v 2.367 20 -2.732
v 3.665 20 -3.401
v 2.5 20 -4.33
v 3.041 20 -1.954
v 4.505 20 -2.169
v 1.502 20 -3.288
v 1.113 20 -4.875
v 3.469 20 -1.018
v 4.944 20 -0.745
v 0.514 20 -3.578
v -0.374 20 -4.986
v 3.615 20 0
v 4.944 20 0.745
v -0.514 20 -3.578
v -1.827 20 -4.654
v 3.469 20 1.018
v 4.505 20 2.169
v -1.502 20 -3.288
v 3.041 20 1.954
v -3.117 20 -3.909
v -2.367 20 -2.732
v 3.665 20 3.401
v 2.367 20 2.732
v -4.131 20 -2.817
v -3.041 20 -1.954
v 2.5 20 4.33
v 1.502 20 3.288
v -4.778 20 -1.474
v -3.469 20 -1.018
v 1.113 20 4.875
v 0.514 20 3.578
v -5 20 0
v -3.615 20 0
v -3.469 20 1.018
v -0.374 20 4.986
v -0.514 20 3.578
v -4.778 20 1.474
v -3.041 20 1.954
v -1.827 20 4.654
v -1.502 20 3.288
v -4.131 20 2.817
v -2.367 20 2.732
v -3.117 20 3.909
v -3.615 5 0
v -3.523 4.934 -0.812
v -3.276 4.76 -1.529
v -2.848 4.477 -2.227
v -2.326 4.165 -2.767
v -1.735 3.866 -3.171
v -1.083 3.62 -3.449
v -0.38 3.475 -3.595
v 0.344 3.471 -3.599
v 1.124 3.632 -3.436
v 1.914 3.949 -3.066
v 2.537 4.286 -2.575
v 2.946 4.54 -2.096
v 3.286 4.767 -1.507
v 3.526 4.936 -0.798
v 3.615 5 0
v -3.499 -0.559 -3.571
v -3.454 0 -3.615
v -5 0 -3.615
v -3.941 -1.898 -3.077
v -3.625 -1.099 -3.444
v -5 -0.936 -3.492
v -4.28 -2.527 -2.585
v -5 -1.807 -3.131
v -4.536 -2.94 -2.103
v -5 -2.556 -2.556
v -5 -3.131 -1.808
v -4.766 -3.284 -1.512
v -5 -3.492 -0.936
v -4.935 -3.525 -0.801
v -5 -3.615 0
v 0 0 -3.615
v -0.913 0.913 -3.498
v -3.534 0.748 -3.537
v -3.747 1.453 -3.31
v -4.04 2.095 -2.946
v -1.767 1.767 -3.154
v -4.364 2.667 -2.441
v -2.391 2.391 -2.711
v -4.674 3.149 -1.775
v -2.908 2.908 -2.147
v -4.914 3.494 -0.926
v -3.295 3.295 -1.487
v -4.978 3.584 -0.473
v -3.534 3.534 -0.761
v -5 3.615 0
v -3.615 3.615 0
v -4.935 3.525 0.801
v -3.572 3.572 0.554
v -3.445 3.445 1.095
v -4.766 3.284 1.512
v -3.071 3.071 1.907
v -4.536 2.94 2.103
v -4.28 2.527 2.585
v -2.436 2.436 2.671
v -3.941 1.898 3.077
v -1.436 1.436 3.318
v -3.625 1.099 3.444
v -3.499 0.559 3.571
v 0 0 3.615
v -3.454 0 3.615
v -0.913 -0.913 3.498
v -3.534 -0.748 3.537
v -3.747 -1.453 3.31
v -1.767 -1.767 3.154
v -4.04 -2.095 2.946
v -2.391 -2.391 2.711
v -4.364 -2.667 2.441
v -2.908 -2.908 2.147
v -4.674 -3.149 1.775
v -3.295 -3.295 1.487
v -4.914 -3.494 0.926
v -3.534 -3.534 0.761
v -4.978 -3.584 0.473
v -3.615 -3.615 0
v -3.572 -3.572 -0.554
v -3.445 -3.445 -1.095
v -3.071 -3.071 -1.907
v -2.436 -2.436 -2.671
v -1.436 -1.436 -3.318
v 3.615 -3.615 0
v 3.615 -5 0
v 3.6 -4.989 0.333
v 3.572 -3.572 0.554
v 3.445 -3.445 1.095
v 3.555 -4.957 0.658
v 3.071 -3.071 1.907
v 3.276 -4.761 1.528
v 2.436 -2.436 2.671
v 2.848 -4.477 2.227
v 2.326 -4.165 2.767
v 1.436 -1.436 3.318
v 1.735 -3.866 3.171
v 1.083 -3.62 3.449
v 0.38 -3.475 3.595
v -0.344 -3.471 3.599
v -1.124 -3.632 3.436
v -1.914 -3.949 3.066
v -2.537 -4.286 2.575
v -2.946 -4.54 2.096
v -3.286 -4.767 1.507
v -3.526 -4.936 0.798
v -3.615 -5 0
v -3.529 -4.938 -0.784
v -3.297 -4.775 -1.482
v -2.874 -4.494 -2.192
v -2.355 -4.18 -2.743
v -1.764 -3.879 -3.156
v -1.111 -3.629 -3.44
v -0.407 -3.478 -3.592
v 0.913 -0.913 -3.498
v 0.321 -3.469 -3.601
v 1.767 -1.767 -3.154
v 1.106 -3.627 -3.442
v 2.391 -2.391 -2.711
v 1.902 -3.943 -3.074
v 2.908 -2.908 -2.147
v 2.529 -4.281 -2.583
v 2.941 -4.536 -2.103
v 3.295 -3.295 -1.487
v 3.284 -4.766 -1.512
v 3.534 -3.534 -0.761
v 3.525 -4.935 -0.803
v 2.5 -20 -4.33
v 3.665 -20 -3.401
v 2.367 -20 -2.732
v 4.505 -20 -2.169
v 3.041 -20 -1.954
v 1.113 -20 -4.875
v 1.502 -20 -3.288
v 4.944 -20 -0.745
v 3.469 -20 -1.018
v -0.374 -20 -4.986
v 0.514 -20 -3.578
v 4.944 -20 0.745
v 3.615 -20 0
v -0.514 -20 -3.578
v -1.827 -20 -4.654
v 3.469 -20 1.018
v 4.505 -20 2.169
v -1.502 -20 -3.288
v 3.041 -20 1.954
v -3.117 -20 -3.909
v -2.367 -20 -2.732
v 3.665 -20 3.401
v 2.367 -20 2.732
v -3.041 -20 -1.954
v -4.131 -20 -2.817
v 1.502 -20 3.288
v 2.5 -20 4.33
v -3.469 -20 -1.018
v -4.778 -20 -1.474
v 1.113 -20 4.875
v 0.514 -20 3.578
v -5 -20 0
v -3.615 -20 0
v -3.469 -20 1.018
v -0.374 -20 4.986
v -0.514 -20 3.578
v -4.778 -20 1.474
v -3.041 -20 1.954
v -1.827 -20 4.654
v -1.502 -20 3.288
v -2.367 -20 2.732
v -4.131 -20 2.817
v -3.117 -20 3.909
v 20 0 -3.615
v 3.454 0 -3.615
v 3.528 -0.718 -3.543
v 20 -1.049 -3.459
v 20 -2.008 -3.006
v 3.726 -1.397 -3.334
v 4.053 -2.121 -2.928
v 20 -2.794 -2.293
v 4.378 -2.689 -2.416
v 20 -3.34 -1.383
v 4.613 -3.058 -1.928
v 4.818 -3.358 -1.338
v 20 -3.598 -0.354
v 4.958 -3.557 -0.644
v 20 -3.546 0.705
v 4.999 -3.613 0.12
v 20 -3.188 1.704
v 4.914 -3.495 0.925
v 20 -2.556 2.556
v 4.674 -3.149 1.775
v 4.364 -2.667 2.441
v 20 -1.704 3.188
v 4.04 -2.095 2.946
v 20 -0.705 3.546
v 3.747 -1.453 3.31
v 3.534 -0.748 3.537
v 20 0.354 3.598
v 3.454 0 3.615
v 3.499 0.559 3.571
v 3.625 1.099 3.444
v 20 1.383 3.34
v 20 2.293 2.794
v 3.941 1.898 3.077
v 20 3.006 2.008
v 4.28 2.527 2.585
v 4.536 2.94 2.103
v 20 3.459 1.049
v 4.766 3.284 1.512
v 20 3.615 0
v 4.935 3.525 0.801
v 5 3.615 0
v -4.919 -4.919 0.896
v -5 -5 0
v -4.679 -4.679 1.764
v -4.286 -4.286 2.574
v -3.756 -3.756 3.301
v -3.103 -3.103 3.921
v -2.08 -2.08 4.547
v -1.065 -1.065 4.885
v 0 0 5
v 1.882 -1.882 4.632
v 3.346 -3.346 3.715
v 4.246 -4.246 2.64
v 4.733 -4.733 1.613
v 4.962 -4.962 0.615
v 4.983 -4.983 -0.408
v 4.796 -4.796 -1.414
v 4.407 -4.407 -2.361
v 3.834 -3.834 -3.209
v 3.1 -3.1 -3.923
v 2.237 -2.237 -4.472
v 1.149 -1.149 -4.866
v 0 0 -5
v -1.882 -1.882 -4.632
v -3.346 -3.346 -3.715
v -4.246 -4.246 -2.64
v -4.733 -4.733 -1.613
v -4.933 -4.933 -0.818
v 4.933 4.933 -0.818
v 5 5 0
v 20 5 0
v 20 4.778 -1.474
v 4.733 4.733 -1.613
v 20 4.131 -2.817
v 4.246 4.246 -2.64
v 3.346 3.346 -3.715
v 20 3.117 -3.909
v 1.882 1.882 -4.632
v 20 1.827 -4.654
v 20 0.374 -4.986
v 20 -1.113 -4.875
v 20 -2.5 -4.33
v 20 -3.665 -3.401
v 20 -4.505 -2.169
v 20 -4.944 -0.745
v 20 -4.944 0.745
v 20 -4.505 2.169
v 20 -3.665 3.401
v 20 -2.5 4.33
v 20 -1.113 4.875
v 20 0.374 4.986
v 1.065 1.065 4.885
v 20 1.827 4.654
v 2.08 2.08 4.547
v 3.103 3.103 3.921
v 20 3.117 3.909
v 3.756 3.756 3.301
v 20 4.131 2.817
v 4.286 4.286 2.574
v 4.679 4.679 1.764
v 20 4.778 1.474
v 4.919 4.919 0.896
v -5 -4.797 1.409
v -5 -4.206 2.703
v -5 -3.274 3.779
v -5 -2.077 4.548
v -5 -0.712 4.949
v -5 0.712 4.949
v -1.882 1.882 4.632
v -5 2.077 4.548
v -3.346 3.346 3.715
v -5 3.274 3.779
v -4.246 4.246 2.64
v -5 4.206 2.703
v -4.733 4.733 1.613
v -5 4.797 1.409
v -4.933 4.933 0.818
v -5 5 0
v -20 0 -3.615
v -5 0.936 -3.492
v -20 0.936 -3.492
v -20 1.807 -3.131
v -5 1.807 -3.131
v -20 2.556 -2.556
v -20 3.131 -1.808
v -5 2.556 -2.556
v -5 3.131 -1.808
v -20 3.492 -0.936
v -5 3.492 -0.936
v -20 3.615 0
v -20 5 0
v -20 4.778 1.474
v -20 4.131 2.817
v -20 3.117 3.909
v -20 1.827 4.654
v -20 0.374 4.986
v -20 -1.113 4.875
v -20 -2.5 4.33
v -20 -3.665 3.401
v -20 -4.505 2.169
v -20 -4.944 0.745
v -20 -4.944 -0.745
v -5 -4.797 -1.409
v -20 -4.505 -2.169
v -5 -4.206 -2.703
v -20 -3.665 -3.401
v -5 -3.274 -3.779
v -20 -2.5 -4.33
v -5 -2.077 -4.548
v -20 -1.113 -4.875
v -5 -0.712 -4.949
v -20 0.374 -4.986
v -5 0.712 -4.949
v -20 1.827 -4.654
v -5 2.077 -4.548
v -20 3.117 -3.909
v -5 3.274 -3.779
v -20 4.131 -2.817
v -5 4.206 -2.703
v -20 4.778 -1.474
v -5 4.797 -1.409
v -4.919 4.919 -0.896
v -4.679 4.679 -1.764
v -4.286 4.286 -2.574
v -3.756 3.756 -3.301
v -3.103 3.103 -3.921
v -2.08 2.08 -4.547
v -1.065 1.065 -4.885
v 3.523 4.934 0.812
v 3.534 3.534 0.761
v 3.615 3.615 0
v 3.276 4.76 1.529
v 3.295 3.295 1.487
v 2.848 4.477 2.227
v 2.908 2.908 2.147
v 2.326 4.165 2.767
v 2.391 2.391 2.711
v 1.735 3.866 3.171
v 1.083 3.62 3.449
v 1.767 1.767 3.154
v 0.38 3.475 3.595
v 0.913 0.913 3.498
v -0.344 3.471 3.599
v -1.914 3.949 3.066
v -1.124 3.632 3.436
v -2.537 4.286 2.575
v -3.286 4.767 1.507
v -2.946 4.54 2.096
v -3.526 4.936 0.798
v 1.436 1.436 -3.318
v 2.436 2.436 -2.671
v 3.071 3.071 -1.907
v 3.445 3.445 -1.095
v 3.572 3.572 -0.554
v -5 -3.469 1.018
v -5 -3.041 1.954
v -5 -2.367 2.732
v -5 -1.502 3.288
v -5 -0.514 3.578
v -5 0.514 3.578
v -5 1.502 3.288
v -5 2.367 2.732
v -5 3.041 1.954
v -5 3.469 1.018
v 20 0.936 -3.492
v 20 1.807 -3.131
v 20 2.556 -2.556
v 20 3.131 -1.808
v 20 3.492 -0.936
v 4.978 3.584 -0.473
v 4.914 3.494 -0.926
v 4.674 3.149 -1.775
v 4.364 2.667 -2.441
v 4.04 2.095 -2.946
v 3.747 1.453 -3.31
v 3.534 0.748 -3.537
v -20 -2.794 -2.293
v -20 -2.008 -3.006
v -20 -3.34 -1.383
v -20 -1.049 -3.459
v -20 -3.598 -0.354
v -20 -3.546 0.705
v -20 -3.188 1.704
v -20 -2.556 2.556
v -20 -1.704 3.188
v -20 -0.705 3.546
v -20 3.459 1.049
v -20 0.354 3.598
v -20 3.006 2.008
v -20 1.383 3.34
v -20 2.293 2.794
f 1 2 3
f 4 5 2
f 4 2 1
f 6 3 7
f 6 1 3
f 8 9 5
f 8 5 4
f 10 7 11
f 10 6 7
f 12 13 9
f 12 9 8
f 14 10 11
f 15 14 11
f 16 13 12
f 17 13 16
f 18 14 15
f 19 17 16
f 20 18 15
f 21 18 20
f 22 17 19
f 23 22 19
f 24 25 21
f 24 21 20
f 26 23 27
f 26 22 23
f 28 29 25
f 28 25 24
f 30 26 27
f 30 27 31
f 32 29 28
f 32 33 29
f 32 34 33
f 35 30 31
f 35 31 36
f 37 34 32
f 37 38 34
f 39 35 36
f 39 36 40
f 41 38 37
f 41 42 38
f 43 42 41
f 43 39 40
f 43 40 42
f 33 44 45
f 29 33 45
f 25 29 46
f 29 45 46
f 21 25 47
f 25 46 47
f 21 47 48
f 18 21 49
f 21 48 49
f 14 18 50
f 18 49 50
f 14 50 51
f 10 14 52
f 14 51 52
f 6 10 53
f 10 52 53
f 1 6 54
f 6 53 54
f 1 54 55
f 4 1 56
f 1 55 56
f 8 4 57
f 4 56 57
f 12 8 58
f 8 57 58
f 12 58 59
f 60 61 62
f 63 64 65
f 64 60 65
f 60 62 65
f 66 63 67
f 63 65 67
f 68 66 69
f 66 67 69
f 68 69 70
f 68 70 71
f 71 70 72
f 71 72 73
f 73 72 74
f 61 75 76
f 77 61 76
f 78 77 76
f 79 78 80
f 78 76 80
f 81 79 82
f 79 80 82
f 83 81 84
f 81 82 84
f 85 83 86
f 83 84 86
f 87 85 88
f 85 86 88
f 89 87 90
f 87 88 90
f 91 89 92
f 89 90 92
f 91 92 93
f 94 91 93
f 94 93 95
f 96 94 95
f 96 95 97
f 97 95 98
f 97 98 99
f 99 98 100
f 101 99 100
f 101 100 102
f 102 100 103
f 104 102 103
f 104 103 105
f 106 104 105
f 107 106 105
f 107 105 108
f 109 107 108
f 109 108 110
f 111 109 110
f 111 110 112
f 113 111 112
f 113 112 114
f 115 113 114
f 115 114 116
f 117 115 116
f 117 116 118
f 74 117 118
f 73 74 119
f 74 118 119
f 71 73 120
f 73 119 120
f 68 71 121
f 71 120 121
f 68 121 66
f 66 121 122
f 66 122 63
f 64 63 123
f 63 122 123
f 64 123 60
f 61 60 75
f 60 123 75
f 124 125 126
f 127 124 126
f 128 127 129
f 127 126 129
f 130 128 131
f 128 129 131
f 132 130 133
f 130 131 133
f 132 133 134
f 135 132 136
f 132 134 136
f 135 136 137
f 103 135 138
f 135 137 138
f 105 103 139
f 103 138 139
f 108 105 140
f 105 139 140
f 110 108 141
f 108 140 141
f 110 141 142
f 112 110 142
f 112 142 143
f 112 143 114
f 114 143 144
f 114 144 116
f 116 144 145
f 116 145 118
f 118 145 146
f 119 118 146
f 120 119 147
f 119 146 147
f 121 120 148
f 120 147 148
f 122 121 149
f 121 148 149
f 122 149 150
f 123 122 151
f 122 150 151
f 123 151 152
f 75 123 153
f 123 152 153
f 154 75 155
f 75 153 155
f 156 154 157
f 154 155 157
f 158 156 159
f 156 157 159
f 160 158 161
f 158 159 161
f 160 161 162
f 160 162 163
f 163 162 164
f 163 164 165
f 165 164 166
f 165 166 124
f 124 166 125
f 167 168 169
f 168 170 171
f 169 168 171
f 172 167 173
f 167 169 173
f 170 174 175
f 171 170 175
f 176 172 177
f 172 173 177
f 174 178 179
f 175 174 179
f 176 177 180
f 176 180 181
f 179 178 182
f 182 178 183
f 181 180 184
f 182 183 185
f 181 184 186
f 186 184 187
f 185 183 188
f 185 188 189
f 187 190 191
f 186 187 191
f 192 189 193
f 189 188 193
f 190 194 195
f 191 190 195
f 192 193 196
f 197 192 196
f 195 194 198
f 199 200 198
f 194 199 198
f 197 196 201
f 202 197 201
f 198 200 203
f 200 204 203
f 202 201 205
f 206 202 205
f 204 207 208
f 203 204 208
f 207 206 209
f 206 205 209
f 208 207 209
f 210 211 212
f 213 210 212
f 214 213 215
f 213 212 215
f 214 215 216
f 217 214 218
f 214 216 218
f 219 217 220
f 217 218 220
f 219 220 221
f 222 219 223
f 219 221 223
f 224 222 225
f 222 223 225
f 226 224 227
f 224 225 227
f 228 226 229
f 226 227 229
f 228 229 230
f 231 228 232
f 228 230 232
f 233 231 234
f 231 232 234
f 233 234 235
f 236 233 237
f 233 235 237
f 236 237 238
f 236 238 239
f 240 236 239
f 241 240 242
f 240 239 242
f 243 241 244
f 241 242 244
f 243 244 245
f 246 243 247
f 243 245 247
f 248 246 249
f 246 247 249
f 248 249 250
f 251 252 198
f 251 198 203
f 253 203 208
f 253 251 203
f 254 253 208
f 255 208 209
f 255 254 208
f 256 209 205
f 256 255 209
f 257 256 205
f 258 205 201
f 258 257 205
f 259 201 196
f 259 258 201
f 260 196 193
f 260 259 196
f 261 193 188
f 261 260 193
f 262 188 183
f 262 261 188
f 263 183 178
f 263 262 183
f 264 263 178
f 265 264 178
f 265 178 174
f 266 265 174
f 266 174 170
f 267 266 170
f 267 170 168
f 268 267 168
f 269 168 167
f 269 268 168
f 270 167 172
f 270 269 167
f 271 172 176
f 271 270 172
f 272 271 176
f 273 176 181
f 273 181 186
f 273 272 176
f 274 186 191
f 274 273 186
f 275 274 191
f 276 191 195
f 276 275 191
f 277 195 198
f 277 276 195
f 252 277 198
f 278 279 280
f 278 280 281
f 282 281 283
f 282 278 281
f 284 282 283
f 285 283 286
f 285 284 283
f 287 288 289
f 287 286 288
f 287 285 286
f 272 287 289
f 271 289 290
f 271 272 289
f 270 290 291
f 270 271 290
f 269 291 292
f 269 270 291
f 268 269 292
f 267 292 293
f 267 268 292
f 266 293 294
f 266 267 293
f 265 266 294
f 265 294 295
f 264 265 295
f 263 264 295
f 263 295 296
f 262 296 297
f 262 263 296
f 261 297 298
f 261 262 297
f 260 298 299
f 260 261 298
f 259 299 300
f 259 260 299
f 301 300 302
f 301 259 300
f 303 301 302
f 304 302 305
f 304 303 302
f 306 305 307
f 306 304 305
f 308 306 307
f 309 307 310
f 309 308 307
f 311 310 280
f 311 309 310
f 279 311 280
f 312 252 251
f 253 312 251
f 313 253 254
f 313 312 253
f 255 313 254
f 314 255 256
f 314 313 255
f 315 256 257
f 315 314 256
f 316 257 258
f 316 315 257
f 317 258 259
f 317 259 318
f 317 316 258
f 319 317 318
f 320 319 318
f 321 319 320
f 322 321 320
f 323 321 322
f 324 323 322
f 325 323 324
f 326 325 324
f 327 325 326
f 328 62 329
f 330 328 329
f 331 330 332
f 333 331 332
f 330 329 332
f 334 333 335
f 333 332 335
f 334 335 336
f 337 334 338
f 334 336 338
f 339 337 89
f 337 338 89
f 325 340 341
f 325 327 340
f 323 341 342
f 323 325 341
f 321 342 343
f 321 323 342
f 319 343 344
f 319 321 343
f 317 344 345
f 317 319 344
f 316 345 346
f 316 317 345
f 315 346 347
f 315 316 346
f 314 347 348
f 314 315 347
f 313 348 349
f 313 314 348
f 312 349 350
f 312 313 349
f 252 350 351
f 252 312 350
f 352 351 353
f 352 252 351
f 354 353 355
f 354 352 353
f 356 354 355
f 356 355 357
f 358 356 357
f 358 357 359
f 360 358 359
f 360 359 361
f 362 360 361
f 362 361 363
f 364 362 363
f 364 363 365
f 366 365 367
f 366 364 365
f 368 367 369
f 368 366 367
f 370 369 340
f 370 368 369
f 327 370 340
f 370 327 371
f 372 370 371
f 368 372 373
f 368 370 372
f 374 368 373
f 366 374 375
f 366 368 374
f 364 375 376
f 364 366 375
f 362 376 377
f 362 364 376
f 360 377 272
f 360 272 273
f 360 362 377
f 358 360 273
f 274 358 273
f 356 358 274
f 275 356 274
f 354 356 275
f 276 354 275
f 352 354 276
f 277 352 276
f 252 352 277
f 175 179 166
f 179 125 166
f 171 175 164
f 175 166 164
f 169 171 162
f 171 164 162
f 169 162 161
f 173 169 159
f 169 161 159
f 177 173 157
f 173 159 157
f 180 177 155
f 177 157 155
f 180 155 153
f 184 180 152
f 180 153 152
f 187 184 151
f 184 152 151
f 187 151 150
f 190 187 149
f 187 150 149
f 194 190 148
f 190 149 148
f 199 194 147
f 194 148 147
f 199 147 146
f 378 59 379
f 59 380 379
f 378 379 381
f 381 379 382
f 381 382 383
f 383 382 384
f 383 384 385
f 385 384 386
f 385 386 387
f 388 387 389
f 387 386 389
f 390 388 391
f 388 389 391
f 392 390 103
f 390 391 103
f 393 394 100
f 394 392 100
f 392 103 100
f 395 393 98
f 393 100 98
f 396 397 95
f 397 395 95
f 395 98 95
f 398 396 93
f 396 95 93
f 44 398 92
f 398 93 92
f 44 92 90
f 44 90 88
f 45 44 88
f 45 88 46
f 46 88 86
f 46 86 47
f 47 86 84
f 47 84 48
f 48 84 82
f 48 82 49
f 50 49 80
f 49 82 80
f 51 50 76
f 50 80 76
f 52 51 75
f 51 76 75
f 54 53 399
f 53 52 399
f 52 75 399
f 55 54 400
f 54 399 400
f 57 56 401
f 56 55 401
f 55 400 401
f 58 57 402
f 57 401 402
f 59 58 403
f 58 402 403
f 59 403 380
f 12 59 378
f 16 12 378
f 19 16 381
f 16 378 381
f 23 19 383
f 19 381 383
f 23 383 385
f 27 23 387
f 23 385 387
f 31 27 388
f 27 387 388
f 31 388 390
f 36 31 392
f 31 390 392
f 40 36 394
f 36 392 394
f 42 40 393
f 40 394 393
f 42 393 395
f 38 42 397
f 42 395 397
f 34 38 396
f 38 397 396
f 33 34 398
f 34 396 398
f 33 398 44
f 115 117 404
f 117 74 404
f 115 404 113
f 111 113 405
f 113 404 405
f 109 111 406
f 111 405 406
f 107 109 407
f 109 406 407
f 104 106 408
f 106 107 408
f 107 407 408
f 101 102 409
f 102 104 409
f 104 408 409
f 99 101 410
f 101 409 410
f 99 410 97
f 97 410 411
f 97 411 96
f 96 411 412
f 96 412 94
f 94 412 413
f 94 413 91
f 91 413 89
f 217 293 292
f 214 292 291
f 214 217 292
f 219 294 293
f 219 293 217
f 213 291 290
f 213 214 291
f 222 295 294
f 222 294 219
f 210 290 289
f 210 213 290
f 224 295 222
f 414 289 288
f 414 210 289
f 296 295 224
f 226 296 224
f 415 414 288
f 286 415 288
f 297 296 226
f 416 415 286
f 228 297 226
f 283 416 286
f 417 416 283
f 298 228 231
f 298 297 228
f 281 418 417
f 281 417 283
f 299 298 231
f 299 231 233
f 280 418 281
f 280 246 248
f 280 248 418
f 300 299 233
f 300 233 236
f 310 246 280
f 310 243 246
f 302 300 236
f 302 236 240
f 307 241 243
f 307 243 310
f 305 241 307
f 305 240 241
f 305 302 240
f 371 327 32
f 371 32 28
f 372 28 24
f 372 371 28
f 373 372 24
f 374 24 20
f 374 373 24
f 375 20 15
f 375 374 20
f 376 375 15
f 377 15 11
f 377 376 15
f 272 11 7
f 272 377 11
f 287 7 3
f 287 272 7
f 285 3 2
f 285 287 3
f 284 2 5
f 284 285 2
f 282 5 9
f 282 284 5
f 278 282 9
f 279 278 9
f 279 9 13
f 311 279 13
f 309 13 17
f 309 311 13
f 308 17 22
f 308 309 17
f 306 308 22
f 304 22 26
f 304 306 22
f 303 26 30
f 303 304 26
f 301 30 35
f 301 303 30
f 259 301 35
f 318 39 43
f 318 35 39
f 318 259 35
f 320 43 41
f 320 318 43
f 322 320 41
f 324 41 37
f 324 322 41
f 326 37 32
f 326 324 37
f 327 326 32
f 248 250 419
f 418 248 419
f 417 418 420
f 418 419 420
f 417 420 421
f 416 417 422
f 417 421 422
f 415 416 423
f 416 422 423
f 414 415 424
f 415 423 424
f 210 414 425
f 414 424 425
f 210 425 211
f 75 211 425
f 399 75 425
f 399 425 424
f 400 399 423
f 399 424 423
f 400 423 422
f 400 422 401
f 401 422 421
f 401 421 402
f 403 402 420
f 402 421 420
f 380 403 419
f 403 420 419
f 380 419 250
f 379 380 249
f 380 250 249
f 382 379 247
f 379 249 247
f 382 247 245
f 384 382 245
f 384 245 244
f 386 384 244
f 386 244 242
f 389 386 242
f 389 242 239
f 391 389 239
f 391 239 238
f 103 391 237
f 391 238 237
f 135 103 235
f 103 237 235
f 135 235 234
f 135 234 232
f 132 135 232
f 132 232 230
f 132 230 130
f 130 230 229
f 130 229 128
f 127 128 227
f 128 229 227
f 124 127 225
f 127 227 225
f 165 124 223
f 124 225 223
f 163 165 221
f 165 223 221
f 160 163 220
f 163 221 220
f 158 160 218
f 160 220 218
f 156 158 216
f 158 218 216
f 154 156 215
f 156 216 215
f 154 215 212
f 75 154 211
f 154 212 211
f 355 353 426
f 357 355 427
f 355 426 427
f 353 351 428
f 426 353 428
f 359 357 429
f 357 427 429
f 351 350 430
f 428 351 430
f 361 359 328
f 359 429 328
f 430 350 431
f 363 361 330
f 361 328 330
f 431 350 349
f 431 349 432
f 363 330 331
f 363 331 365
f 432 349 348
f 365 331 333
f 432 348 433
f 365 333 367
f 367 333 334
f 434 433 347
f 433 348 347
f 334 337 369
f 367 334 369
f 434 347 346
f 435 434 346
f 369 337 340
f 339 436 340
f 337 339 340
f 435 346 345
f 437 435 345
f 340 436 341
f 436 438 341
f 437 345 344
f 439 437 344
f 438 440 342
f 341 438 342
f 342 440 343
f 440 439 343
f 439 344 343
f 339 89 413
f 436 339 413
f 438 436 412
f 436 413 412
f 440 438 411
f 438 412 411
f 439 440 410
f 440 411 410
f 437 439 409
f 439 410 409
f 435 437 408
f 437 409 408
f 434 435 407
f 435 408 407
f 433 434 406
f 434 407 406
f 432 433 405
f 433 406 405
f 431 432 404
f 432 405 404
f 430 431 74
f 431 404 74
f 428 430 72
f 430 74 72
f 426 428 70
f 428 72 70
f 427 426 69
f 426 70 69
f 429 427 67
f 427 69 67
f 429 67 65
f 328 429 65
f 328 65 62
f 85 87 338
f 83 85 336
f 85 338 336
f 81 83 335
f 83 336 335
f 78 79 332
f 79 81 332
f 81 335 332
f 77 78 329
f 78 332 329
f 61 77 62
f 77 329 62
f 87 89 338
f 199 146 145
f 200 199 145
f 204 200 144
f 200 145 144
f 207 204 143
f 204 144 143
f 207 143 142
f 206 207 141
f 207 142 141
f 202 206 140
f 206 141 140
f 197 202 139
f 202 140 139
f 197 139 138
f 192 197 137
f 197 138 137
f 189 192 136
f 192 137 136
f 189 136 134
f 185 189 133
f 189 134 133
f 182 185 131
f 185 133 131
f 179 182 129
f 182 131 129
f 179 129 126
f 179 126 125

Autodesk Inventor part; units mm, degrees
ref_plane "XZ Plane" through (0, 0, 0) normal (0, 1, 0) x (-1, 0, 0)
ref_plane "XY Plane" through (0, 0, 0) normal (0, 0, 1) x (1, 0, 0)
sketch "Sketch1" plane through (0, 0, 0) normal (0, 1, 0) x (-1, 0, 0)
  circle A0 centre (0, 0) radius 3.615
  circle A1 centre (0, 0) radius 5
  dimension "d0" = 7.23
  dimension "d1" = 10
extrude "Extrusion1" add sketch "Sketch1" along normal mid plane 40
ref_plane "Work Plane1" through (-5, 0, 0) normal (1, 0, 0) x (0, 1, 0)
sketch "Sketch2" plane through (-5, 0, 0) normal (1, 0, 0) x (0, 1, 0)
  circle A0 centre (0, 0) radius 3.615
  circle A1 centre (0, 0) radius 5
  dimension "d4" = 7.23
  dimension "d5" = 10
extrude "Extrusion2" add sketch "Sketch2" along normal blind 25 and the other way blind 15
sketch "Sketch3" plane through (20, 0, 0) normal (1, 0, 0) x (0, 0, -1)
  circle A0 centre (0, 0) radius 3.615
extrude "Extrusion3" cut sketch "Sketch3" against normal through all
sketch "Sketch4" plane through (0, -20, 0) normal (0, -1, 0) x (1, 0, 0)
  circle A0 centre (0, 0) radius 3.615
  dimension "d12" = 7.23
extrude "Extrusion4" cut sketch "Sketch4" against normal through all
properties part number "carrefour"
